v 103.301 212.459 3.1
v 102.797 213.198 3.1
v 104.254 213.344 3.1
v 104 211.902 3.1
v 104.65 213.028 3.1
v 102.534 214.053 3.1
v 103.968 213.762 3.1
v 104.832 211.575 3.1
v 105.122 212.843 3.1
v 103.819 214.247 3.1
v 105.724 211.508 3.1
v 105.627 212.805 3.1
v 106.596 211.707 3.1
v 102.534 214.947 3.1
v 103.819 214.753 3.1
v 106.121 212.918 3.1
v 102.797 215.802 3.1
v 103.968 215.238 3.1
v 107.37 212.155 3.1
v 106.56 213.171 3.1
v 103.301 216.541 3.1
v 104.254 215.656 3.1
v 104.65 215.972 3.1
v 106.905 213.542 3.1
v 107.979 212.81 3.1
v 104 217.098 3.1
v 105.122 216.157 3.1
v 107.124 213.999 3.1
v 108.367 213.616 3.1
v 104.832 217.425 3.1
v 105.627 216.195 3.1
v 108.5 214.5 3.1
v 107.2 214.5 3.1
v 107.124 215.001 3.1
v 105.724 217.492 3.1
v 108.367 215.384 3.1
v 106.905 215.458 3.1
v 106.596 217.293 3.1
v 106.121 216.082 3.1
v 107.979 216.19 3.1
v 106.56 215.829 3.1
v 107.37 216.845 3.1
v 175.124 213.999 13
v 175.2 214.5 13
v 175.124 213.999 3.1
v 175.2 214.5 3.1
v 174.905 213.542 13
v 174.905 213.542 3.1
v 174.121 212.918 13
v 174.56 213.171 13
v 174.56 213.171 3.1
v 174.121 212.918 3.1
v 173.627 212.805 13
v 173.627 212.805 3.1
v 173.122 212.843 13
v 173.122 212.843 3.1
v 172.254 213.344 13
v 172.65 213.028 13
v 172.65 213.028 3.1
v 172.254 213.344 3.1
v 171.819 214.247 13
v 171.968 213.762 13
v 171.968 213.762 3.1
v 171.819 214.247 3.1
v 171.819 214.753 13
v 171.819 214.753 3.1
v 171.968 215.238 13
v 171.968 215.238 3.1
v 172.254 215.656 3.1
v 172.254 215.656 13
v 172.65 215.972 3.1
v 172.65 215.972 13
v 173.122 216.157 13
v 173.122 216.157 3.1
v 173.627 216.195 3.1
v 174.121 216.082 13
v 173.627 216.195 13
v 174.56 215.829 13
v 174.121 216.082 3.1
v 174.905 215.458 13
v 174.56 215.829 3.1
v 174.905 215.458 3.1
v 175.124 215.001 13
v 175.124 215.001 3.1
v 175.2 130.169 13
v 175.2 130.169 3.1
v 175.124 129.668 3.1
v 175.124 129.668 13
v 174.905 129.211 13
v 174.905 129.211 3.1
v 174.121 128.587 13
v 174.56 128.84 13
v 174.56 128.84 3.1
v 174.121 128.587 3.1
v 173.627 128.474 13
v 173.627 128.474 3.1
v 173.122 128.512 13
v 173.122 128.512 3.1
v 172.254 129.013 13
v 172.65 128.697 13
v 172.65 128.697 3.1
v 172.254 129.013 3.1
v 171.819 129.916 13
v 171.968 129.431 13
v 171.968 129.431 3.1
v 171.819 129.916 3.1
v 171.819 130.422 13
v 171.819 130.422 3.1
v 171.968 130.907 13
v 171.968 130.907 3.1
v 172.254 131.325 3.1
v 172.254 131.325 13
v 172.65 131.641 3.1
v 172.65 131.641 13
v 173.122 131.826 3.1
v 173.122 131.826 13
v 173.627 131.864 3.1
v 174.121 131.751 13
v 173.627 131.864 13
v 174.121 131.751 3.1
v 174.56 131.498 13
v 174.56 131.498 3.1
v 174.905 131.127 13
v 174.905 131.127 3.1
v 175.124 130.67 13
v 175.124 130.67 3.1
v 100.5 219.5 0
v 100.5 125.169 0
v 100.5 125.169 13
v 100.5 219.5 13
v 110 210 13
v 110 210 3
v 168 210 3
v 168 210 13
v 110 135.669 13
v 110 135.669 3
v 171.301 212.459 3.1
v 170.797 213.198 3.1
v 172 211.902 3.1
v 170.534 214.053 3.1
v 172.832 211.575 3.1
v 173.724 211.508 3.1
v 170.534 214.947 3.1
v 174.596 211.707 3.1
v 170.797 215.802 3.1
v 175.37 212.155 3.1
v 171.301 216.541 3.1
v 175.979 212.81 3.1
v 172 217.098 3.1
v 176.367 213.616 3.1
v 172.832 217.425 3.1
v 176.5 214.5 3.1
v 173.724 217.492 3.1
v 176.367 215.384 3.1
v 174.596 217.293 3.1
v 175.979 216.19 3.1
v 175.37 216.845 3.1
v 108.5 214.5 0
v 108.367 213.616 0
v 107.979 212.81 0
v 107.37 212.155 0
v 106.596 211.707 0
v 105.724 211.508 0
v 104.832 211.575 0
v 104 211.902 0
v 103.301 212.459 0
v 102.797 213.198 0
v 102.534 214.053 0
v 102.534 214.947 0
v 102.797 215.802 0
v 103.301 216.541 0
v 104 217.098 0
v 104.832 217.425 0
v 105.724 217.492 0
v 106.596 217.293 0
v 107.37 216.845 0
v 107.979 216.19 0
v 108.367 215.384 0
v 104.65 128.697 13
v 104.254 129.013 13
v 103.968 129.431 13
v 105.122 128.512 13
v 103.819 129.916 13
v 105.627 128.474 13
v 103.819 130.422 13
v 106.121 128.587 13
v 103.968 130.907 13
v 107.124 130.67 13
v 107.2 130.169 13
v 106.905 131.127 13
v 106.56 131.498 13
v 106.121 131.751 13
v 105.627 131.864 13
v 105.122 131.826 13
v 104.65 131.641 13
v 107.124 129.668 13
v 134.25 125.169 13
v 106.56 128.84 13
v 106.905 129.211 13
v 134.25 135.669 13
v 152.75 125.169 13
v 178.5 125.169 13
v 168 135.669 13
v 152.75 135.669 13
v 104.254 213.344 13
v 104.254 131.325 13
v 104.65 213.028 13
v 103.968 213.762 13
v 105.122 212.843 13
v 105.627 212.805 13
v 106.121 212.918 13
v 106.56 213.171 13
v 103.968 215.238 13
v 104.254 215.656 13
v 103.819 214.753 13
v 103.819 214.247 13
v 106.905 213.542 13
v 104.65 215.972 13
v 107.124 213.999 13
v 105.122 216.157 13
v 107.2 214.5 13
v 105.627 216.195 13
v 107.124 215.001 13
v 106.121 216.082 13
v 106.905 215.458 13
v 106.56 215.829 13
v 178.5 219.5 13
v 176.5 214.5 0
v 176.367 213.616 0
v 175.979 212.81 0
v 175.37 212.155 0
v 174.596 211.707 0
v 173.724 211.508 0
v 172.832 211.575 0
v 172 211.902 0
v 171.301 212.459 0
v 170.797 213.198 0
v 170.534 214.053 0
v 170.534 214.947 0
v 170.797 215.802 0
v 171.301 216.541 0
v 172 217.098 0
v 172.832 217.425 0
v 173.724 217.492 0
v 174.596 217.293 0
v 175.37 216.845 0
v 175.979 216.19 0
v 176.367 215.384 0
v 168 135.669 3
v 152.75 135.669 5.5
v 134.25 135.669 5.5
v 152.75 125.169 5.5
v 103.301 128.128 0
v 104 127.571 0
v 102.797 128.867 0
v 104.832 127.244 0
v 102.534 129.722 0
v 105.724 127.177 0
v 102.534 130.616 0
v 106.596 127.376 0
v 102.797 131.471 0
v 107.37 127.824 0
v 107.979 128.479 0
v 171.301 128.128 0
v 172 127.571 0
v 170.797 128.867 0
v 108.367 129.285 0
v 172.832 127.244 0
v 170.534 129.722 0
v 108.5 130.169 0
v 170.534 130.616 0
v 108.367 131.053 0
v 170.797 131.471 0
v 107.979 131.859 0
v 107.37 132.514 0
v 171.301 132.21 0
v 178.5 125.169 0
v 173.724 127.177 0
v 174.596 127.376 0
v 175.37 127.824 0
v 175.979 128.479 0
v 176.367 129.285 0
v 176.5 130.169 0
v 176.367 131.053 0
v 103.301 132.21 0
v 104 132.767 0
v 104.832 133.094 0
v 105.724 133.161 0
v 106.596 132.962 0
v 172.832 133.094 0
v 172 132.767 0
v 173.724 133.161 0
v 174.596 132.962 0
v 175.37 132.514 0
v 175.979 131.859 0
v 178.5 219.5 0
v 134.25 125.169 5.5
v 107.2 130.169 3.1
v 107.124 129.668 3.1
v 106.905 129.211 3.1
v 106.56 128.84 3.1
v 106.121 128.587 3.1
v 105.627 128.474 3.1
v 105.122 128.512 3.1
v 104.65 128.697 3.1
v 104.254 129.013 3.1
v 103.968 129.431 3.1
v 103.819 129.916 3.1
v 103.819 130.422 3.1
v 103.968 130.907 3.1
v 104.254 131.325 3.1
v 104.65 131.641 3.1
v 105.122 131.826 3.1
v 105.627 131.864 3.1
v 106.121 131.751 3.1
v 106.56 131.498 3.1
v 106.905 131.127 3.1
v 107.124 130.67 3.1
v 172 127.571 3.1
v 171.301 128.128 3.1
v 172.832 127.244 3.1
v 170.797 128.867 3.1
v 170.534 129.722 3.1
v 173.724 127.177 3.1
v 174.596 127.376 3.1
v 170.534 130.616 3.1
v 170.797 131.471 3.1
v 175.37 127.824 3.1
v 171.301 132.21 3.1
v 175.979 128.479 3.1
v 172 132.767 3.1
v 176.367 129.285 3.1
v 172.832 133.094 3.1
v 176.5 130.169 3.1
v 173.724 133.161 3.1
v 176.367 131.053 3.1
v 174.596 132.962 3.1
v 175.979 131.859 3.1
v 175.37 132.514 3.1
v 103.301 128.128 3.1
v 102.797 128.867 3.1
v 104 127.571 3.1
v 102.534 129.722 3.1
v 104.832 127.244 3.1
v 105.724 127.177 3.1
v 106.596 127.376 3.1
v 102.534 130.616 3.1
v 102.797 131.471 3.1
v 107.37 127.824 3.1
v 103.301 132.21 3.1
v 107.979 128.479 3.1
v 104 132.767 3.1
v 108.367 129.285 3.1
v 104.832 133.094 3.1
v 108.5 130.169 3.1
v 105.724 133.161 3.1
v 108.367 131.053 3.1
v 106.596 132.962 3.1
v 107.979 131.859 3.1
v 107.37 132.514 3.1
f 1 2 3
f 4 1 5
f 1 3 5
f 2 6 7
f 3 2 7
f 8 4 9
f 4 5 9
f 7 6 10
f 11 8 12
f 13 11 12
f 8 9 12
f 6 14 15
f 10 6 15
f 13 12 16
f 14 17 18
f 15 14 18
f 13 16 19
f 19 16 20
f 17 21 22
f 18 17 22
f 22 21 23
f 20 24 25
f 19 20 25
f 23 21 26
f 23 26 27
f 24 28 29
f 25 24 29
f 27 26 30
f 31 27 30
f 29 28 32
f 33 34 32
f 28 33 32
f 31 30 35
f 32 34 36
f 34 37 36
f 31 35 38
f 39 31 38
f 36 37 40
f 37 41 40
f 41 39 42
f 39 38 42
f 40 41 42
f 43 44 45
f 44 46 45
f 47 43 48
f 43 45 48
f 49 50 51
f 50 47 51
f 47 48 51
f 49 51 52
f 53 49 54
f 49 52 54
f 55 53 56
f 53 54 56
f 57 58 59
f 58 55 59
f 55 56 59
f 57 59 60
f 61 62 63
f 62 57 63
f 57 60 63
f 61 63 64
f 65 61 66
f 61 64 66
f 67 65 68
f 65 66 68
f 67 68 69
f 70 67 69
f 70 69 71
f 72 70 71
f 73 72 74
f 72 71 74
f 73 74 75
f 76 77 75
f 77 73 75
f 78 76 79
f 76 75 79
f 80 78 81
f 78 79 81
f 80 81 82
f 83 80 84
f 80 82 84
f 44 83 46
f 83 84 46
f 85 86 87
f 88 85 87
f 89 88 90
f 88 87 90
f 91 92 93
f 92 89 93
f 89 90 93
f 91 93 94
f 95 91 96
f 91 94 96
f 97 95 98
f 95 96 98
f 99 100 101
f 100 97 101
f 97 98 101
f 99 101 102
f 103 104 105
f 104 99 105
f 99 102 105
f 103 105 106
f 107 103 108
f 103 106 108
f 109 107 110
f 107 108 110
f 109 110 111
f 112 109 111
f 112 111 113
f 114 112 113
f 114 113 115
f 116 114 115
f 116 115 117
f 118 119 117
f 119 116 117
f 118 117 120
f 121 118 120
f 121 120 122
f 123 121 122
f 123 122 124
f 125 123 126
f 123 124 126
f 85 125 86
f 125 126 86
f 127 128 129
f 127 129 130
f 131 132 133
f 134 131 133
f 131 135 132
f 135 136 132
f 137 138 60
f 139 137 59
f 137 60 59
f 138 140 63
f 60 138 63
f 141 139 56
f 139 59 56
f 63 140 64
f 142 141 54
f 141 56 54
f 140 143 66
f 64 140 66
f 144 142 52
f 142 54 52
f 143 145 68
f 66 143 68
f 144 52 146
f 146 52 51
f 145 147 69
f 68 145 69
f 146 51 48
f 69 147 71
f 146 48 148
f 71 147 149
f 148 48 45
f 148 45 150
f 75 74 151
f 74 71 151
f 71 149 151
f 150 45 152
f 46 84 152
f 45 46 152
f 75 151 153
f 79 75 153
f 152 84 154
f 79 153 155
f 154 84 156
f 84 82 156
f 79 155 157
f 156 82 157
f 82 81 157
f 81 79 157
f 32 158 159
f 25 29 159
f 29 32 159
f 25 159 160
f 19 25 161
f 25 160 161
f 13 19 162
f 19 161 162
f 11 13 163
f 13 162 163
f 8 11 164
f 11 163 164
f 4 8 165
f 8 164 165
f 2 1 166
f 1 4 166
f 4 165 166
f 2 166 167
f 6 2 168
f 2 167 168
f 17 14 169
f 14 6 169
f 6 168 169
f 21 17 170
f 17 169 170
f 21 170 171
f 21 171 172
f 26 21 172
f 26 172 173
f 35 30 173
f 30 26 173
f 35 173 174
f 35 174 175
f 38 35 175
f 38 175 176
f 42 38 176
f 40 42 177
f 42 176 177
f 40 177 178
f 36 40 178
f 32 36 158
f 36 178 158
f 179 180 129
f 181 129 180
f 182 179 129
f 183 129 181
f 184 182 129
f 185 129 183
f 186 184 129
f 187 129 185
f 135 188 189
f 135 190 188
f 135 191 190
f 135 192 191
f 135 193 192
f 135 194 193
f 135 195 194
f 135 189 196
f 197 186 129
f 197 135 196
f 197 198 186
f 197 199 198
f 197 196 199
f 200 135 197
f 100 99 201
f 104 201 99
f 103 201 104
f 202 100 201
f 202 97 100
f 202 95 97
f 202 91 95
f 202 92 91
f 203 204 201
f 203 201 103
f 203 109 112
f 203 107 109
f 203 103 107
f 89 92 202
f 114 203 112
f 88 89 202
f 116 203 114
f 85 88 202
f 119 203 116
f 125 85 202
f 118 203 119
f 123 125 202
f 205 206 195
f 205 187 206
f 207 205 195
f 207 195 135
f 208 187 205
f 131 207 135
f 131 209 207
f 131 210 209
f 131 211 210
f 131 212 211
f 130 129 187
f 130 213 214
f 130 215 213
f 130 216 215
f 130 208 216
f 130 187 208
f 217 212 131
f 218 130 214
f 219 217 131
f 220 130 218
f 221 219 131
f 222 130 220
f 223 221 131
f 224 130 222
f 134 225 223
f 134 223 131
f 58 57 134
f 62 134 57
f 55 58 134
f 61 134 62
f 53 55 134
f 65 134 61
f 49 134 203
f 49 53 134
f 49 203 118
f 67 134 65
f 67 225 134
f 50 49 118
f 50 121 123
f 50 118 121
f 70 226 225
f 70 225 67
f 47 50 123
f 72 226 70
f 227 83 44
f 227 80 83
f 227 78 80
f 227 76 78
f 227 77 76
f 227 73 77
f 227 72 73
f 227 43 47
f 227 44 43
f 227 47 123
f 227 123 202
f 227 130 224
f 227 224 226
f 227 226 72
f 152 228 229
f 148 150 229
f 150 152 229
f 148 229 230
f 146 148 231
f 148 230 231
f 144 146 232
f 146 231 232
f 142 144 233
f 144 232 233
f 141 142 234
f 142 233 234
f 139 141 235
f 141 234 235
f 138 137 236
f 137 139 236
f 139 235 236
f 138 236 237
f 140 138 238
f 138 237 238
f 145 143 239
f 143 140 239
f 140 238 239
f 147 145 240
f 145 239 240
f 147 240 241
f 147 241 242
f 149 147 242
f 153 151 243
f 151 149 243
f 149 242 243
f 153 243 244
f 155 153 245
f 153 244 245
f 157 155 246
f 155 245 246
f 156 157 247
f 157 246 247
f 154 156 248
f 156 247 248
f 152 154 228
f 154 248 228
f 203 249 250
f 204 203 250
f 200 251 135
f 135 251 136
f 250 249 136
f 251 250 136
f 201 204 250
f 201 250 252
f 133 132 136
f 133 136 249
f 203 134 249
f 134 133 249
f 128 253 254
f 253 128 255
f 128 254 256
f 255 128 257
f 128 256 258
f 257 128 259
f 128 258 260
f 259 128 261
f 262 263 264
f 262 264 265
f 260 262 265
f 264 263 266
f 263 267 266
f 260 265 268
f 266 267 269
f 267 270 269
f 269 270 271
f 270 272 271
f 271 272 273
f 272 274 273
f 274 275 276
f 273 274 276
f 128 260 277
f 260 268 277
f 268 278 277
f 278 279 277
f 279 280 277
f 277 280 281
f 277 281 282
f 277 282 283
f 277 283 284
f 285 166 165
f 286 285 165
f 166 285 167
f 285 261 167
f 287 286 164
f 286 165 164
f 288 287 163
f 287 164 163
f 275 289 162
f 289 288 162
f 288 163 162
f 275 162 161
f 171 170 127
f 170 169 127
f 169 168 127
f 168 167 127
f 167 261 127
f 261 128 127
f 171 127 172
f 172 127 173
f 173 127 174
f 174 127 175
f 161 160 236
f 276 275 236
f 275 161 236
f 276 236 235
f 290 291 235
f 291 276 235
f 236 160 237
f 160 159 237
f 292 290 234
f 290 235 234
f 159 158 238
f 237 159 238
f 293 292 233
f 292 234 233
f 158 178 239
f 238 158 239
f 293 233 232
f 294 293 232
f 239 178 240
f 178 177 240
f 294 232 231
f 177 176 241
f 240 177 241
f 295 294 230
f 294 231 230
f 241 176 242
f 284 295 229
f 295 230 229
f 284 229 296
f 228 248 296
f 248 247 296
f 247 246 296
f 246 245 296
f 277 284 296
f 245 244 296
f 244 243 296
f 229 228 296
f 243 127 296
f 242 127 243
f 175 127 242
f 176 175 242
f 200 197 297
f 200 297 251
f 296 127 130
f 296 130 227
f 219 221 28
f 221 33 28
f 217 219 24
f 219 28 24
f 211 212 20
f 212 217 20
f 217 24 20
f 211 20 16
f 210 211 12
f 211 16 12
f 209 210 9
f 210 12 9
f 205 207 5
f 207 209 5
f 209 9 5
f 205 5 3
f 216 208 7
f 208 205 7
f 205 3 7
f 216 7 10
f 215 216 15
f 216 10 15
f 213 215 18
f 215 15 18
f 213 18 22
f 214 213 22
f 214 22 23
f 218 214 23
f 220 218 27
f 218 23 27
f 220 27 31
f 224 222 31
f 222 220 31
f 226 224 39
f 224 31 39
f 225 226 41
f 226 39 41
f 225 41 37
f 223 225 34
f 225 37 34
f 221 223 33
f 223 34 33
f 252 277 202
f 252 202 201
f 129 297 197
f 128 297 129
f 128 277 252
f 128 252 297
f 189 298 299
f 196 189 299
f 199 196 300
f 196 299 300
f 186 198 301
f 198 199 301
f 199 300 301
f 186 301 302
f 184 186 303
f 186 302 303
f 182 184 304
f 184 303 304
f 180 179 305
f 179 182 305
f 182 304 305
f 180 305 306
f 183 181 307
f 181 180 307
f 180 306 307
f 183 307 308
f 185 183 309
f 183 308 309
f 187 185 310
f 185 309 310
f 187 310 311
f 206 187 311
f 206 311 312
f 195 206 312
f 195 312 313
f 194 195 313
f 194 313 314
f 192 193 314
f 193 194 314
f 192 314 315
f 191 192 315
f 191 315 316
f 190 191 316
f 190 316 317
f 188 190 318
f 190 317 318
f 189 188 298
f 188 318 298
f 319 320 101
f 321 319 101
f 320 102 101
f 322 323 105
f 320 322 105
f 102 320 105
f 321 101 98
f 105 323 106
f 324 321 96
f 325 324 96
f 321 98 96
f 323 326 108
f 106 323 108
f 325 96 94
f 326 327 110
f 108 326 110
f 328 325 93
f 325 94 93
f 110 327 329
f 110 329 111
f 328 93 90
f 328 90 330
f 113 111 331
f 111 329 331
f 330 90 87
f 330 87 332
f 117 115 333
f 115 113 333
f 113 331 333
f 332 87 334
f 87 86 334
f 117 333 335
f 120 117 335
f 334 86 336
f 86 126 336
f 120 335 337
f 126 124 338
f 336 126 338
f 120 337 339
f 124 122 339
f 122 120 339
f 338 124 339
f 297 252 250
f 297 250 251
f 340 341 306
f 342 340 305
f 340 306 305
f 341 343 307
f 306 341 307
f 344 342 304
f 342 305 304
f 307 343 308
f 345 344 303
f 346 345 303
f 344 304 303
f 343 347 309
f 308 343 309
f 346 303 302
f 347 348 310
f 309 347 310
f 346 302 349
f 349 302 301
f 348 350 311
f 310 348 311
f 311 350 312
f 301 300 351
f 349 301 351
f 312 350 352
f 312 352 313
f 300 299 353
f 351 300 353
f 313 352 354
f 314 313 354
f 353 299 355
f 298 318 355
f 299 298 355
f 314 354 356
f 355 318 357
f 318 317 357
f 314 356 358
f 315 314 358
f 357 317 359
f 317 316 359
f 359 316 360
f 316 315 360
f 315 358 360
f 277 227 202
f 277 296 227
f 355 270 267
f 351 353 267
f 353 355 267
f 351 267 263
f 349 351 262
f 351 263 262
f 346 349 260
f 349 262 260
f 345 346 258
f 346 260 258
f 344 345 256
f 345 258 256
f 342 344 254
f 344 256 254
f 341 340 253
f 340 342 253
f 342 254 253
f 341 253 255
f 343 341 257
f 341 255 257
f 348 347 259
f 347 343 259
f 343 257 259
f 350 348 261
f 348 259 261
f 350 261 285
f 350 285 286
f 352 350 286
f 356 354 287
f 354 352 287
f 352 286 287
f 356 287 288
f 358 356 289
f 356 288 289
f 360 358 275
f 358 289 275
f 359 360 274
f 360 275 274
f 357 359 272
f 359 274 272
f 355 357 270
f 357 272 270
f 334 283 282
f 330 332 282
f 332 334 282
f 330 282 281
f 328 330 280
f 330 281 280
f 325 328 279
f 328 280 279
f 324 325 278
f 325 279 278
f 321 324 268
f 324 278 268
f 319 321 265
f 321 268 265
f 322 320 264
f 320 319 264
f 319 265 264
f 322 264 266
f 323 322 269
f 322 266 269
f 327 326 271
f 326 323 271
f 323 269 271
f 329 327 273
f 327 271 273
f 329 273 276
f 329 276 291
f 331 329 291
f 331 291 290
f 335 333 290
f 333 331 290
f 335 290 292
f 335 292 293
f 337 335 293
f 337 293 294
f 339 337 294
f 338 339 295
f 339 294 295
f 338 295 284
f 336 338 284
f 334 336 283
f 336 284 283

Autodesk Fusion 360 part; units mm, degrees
sketch "Sketch1" plane through (0, 0, 0) normal (0, 0, 1) x (1, 0, 0) in component "HackYeah (1)"
  line L0 (110, 210) -> (168, 210)
  line L1 (168, 210) -> (168, 135.669)
  line L2 (168, 135.669) -> (110, 135.669)
  line L3 (110, 135.669) -> (110, 210)
  line L4 (100.5, 219.5) -> (178.5, 219.5)
  line L5 (178.5, 219.5) -> (178.5, 125.169)
  line L6 (178.5, 125.169) -> (100.5, 125.169)
  line L7 (100.5, 125.169) -> (100.5, 219.5)
  circle A0 centre (105.5, 130.169) radius 1.7
  circle A1 centre (173.5, 130.169) radius 1.7
  circle A2 centre (105.5, 214.5) radius 1.7
  circle A3 centre (173.5, 214.5) radius 1.7
  circle A4 centre (105.5, 130.169) radius 3
  circle A5 centre (173.5, 130.169) radius 3
  circle A6 centre (105.5, 214.5) radius 3
  circle A7 centre (173.5, 214.5) radius 3
  dimension "d22" = 58
  dimension "d23" = 74.331
  dimension "d24" = 78
  dimension "d25" = 94.331
  dimension "d26" = 9.5
  dimension "d27" = 9.5
  dimension "d28" = 3.4
  dimension "d29" = 5
  dimension "d30" = 5
  dimension "d31" = 3.4
  dimension "d32" = 5
  dimension "d33" = 5
  dimension "d34" = 3.4
  dimension "d35" = 5
  dimension "d36" = 5
  dimension "d37" = 3.4
  dimension "d38" = 5
  dimension "d39" = 5
  dimension "d40" = 6
  dimension "d41" = 6
  dimension "d42" = 6
  dimension "d43" = 6
extrude "Extrude1" add sketch "Sketch1" along normal blind 9.9 from surface at 3.1 contours A4 | A5 | A6 | A7 makes body 1 at (102.7356, 213.3347, 9.7) makes body 2 at (108.2644, 131.3343, 9.7) makes body 3 at (171.4053, 212.3524, 9.7) makes body 4 at (176.2644, 131.3343, 9.7) in component "HackYeah (1)"
extrude "Extrude2" add sketch "Sketch1" along normal blind 13 contours L4 L5 L6 L7 bodies 1 2 3 4 in component "HackYeah (1)"
extrude "Extrude3" add sketch "Sketch1" along normal blind 3 contours L0 L1 L2 L3 bodies 1 in component "HackYeah (1)"
sketch "Sketch2" plane through (0, 0, 13) normal (0, 0, 1) x (-1, 0, 0) in component "HackYeah (1)"
  circle A0 centre (-105.5, -214.5) radius 1.7
  circle A1 centre (-173.5, -130.169) radius 1.7
  line L0 (-168, -135.669) -> (-110, -135.669)
  line L1 (-110, -135.669) -> (-110, -210)
  line L2 (-110, -210) -> (-168, -210)
  line L3 (-168, -210) -> (-168, -135.669)
  line L4 (-100.5, -125.169) -> (-178.5, -125.169)
  line L5 (-178.5, -125.169) -> (-178.5, -219.5)
  line L6 (-178.5, -219.5) -> (-100.5, -219.5)
  line L7 (-100.5, -219.5) -> (-100.5, -125.169)
  circle A2 centre (-105.5, -130.169) radius 1.7
  circle A3 centre (-173.5, -214.5) radius 1.7
  line L8 (24.854, 25.8508) -> (43.354, 25.8508)
  line L9 (43.354, 25.8508) -> (43.354, 16.3508)
  line L10 (43.354, 16.3508) -> (24.854, 16.3508)
  line L11 (24.854, 16.3508) -> (24.854, 25.8508)
  line L12 (-152.75, -125.169) -> (-134.25, -125.169)
  line L13 (-134.25, -125.169) -> (-134.25, -135.669)
  line L14 (-134.25, -135.669) -> (-152.75, -135.669)
  line L15 (-152.75, -135.669) -> (-152.75, -125.169)
  dimension "d51" = 18.5
  dimension "d52" = 9.5
  dimension "d53" = 18.5
  dimension "d54" = 10.5
  dimension "d55" = 25.75
extrude "Extrude4" cut sketch "Sketch2" against normal blind 7.5 contours L0 L4 L12 L13 L14 L15 bodies 1 in component "HackYeah (1)"
component "HackYeah (1)" placed x (1, 0, 0) y (0, 1, 0) z (0, 0, 1) at (0, 0, 0)
